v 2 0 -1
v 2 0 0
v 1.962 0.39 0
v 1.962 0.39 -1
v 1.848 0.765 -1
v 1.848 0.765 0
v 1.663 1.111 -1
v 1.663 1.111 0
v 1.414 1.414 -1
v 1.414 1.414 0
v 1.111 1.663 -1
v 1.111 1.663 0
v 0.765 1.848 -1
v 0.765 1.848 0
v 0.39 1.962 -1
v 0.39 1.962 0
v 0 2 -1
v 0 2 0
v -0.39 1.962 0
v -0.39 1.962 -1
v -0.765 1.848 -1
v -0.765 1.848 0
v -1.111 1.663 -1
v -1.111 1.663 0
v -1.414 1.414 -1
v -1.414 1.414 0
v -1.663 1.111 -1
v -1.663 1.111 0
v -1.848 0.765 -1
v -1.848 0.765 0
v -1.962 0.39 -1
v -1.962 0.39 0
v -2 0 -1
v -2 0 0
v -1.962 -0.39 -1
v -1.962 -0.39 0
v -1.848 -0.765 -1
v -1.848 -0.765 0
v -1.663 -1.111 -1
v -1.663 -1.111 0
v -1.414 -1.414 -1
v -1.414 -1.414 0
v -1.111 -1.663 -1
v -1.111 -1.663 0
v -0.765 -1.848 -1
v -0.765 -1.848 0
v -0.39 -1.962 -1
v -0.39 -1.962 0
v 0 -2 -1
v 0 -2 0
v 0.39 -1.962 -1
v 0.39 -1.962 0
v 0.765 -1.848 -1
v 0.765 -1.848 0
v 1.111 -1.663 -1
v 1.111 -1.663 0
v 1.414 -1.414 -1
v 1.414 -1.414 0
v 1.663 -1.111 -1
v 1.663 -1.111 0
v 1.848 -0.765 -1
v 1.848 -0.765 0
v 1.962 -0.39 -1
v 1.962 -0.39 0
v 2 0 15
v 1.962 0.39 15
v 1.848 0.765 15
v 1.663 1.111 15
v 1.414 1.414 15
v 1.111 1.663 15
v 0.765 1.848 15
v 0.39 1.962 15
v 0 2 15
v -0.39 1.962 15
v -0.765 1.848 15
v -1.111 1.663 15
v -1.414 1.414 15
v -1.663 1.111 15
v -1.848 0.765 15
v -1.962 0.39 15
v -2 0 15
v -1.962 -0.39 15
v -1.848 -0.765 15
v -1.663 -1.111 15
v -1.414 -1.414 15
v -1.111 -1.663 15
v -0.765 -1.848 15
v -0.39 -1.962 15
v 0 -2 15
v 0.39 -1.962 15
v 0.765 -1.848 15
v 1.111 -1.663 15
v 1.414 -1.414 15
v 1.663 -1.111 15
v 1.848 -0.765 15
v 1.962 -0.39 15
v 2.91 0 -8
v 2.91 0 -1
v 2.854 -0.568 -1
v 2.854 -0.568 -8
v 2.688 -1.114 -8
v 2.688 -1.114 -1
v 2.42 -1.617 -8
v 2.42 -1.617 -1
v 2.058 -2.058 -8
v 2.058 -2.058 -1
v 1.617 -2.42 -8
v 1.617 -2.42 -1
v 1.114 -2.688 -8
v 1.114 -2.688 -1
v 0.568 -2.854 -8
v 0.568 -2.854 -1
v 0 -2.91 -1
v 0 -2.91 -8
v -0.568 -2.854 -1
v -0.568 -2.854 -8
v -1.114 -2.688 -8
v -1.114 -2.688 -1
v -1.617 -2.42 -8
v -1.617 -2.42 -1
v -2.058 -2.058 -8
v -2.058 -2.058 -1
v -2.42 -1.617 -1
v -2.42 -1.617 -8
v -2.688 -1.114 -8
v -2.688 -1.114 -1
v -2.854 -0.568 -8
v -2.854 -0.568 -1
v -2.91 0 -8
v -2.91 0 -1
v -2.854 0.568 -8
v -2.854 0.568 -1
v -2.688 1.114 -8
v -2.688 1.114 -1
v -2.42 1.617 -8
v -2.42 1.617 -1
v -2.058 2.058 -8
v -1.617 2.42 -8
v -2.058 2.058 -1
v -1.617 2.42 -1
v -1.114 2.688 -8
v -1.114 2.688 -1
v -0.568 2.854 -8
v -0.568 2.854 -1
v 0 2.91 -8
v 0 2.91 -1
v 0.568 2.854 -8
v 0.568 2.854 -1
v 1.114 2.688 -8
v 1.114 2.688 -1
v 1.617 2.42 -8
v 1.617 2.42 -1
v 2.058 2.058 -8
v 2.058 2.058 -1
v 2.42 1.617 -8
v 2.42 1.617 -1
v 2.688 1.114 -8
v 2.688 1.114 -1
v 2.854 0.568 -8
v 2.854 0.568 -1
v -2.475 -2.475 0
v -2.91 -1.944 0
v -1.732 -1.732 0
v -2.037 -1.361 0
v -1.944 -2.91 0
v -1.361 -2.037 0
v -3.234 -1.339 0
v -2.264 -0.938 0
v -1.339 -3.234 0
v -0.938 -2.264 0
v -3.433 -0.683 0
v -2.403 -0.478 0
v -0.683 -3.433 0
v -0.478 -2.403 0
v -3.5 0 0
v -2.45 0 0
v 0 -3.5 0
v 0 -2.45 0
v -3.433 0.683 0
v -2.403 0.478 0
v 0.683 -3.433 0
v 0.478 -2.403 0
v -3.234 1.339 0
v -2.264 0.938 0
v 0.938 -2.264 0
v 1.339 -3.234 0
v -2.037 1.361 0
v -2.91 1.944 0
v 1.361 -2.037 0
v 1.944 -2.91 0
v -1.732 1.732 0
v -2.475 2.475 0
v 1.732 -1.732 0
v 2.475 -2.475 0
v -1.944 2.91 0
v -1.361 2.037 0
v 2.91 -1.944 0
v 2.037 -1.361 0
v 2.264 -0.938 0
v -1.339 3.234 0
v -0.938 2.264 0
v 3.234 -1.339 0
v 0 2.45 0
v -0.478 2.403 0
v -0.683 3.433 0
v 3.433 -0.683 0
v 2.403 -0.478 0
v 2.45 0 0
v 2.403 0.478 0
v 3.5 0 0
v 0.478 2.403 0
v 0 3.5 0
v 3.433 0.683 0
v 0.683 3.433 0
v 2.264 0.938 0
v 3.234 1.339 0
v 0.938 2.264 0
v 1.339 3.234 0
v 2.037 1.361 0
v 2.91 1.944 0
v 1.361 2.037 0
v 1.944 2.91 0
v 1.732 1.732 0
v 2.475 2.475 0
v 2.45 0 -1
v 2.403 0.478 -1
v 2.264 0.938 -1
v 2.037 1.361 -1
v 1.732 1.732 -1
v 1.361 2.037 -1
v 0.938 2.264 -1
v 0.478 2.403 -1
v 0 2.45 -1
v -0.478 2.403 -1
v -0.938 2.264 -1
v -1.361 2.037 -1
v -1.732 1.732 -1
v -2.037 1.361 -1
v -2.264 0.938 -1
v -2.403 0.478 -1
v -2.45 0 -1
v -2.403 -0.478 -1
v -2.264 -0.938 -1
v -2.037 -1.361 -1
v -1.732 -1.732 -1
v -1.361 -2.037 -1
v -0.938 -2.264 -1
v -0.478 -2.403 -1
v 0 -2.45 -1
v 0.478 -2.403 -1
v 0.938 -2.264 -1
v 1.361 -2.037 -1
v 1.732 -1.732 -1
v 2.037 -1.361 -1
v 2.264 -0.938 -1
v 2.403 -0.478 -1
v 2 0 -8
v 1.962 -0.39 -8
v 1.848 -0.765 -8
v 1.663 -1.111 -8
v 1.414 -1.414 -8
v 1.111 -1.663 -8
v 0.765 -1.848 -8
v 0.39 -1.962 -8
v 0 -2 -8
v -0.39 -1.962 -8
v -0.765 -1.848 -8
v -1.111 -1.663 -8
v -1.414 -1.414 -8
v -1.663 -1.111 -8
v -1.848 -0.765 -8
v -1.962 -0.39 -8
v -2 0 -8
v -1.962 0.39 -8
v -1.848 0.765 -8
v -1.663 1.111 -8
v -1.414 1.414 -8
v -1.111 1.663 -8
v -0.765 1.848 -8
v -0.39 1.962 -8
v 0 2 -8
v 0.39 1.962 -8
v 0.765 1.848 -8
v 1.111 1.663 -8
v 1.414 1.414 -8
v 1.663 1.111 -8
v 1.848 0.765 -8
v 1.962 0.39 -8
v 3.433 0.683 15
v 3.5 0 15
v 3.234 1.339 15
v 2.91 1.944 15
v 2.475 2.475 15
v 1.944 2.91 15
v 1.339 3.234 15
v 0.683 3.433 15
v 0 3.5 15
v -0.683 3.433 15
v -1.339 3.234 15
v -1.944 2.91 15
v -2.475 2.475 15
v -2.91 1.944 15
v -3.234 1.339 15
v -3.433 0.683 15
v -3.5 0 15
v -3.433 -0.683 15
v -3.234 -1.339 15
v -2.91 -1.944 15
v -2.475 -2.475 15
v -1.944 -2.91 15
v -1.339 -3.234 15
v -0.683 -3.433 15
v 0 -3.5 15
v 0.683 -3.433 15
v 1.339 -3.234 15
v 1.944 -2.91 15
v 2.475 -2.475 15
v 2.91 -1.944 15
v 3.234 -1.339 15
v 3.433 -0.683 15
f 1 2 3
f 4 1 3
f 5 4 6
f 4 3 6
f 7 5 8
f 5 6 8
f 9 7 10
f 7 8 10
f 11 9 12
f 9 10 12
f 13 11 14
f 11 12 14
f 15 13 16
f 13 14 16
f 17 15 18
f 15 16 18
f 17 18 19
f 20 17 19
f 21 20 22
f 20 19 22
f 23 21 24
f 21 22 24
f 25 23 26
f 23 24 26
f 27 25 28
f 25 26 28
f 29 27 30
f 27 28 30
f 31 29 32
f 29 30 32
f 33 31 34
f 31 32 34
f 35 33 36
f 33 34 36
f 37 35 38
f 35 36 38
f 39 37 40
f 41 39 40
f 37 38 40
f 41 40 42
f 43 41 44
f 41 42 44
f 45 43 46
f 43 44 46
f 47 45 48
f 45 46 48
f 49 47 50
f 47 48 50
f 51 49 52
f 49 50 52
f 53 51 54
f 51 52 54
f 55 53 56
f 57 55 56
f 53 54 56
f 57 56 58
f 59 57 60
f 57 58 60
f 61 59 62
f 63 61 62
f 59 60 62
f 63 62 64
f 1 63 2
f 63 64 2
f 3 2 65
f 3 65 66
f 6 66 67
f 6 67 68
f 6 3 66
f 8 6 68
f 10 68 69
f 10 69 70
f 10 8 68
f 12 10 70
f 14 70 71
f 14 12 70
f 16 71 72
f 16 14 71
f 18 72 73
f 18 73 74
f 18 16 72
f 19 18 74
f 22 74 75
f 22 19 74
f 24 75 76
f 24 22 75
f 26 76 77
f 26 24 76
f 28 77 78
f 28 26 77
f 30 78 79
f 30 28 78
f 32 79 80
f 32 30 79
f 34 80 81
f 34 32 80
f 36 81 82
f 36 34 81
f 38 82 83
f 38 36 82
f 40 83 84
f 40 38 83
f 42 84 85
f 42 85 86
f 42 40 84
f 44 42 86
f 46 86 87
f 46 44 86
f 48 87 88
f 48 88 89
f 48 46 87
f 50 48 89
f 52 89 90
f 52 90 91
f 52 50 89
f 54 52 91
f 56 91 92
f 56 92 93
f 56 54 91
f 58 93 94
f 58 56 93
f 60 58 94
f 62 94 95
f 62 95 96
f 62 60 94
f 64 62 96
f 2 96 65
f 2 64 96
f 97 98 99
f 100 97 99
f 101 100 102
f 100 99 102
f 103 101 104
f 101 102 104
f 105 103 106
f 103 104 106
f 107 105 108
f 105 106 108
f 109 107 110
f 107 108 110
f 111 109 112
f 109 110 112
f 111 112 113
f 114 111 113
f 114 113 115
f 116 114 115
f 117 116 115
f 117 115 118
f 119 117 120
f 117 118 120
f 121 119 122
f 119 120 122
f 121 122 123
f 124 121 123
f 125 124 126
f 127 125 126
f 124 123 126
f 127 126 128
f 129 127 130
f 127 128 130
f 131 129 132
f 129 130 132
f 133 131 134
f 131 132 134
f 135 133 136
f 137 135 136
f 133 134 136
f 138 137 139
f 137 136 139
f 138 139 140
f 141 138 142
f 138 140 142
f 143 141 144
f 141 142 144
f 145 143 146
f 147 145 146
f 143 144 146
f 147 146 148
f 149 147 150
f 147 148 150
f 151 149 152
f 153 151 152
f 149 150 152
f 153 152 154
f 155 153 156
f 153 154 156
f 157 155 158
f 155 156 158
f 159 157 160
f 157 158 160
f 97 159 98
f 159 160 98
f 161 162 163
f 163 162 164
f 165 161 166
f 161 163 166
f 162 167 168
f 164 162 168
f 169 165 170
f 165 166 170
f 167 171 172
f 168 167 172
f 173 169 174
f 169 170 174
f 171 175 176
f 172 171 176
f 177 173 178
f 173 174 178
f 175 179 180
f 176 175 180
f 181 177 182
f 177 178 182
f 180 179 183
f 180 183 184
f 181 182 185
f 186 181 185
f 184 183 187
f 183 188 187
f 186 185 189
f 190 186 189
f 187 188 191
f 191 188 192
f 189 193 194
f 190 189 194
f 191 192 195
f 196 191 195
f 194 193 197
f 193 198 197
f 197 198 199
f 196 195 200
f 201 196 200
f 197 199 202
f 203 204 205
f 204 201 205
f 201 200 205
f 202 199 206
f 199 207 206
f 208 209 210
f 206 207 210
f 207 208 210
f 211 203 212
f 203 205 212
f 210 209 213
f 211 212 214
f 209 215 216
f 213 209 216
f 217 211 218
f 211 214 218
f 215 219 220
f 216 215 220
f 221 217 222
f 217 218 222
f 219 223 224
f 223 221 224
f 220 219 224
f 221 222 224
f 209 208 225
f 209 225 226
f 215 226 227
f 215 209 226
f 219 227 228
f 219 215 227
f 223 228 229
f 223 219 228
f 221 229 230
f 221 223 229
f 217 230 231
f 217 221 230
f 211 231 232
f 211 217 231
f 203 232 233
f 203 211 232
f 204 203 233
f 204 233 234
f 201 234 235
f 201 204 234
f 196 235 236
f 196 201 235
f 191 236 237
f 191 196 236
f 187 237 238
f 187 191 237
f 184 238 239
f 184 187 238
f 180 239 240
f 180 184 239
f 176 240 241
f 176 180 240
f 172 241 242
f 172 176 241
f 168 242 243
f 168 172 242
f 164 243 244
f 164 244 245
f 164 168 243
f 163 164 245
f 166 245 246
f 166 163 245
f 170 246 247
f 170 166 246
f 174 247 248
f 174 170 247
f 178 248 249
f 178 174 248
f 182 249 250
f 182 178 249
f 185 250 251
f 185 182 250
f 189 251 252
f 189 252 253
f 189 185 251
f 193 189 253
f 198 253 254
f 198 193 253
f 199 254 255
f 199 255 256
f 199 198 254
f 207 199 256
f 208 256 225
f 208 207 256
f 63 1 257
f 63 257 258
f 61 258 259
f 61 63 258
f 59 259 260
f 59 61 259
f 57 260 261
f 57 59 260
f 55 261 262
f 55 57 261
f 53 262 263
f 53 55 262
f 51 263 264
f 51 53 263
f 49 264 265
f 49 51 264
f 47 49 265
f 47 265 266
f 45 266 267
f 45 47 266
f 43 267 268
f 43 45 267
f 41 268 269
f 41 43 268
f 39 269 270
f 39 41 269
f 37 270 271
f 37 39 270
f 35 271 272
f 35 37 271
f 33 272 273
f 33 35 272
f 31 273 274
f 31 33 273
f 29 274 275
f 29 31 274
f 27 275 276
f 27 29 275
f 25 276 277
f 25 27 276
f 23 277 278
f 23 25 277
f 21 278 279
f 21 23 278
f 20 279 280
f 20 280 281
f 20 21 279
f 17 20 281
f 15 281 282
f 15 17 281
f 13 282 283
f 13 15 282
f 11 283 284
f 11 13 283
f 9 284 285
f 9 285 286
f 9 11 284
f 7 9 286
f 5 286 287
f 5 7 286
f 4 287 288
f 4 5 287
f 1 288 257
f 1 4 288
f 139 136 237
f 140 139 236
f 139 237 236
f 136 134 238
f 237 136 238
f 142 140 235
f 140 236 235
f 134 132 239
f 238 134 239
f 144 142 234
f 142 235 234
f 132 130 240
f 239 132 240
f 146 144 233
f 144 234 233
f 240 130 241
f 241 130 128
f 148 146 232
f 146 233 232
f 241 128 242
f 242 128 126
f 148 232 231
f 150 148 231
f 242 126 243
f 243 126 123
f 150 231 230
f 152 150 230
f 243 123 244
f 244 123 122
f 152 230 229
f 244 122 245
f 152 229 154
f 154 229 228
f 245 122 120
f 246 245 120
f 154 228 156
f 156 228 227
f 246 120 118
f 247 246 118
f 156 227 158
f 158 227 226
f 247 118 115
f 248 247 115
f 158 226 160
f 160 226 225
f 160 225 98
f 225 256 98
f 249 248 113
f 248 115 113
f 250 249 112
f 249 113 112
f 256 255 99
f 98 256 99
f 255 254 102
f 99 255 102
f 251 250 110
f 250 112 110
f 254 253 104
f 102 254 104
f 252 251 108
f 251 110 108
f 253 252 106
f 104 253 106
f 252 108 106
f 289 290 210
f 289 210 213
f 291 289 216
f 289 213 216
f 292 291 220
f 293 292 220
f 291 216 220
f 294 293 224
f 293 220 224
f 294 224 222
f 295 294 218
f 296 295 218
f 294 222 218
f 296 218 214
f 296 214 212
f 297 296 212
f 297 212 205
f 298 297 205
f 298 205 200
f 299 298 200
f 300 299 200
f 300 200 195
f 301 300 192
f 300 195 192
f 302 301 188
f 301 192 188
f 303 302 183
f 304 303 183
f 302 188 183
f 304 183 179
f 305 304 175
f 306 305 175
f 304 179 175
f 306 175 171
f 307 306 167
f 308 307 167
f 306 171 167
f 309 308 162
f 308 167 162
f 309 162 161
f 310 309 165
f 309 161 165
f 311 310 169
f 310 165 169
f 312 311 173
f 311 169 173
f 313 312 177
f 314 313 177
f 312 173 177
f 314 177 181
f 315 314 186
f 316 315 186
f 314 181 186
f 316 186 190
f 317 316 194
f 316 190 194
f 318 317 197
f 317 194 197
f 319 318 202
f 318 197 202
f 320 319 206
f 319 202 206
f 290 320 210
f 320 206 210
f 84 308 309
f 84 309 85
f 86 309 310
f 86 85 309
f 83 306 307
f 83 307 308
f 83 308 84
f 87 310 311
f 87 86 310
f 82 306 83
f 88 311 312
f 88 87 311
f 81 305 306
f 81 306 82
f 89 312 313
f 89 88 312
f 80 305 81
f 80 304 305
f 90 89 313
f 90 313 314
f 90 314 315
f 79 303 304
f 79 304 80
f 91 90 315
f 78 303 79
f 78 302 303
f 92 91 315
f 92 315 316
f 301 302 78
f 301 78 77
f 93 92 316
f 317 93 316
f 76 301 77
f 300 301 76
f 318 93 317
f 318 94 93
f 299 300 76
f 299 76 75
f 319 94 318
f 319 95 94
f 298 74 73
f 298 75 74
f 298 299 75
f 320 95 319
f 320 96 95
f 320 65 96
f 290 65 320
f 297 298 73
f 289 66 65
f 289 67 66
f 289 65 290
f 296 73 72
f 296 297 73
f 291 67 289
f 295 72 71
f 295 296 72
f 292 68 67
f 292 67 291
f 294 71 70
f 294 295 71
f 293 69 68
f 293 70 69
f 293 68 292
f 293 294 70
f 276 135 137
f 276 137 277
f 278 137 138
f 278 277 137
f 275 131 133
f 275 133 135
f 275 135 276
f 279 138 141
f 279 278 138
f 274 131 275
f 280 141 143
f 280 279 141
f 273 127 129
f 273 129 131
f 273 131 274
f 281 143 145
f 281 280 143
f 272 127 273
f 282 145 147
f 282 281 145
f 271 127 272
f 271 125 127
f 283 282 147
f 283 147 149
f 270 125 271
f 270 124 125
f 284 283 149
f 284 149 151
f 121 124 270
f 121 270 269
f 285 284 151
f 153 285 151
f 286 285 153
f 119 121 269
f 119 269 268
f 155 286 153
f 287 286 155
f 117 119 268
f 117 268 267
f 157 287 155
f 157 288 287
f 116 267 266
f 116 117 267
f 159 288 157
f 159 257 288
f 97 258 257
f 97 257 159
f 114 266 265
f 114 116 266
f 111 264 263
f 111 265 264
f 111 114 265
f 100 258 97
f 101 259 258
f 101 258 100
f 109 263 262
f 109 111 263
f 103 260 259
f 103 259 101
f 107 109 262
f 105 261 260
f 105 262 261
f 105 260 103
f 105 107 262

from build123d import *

# Parameters (mm, degrees)
F0_R     = 3.5
F0_R_2   = 2
F1_DEPTH = 15
F2_R     = 2.45
F2_R_2   = 2
F3_DEPTH = 1
F4_R     = 2.91
F4_R_2   = 2
F5_DEPTH = 7


with BuildPart() as f1:
    # F0 (on Top) → F1 (new body)
    with BuildSketch(Plane.XY):
        Circle(F0_R)
        Circle(F0_R_2, mode=Mode.SUBTRACT)
    extrude(amount=F1_DEPTH)

    # F2 (on Top) → F3 (join)
    with BuildSketch(Plane.XY):
        Circle(F2_R)
        Circle(F2_R_2, mode=Mode.SUBTRACT)
    extrude(amount=-F3_DEPTH)

    # F4 (on face) → F5 (join)
    with BuildSketch(Plane(origin=(0, 0, -1), x_dir=(1, 0, 0), z_dir=(0, 0, -1))):
        Circle(F4_R)
        Circle(F4_R_2, mode=Mode.SUBTRACT)
    extrude(amount=F5_DEPTH)


solid = f1.part
